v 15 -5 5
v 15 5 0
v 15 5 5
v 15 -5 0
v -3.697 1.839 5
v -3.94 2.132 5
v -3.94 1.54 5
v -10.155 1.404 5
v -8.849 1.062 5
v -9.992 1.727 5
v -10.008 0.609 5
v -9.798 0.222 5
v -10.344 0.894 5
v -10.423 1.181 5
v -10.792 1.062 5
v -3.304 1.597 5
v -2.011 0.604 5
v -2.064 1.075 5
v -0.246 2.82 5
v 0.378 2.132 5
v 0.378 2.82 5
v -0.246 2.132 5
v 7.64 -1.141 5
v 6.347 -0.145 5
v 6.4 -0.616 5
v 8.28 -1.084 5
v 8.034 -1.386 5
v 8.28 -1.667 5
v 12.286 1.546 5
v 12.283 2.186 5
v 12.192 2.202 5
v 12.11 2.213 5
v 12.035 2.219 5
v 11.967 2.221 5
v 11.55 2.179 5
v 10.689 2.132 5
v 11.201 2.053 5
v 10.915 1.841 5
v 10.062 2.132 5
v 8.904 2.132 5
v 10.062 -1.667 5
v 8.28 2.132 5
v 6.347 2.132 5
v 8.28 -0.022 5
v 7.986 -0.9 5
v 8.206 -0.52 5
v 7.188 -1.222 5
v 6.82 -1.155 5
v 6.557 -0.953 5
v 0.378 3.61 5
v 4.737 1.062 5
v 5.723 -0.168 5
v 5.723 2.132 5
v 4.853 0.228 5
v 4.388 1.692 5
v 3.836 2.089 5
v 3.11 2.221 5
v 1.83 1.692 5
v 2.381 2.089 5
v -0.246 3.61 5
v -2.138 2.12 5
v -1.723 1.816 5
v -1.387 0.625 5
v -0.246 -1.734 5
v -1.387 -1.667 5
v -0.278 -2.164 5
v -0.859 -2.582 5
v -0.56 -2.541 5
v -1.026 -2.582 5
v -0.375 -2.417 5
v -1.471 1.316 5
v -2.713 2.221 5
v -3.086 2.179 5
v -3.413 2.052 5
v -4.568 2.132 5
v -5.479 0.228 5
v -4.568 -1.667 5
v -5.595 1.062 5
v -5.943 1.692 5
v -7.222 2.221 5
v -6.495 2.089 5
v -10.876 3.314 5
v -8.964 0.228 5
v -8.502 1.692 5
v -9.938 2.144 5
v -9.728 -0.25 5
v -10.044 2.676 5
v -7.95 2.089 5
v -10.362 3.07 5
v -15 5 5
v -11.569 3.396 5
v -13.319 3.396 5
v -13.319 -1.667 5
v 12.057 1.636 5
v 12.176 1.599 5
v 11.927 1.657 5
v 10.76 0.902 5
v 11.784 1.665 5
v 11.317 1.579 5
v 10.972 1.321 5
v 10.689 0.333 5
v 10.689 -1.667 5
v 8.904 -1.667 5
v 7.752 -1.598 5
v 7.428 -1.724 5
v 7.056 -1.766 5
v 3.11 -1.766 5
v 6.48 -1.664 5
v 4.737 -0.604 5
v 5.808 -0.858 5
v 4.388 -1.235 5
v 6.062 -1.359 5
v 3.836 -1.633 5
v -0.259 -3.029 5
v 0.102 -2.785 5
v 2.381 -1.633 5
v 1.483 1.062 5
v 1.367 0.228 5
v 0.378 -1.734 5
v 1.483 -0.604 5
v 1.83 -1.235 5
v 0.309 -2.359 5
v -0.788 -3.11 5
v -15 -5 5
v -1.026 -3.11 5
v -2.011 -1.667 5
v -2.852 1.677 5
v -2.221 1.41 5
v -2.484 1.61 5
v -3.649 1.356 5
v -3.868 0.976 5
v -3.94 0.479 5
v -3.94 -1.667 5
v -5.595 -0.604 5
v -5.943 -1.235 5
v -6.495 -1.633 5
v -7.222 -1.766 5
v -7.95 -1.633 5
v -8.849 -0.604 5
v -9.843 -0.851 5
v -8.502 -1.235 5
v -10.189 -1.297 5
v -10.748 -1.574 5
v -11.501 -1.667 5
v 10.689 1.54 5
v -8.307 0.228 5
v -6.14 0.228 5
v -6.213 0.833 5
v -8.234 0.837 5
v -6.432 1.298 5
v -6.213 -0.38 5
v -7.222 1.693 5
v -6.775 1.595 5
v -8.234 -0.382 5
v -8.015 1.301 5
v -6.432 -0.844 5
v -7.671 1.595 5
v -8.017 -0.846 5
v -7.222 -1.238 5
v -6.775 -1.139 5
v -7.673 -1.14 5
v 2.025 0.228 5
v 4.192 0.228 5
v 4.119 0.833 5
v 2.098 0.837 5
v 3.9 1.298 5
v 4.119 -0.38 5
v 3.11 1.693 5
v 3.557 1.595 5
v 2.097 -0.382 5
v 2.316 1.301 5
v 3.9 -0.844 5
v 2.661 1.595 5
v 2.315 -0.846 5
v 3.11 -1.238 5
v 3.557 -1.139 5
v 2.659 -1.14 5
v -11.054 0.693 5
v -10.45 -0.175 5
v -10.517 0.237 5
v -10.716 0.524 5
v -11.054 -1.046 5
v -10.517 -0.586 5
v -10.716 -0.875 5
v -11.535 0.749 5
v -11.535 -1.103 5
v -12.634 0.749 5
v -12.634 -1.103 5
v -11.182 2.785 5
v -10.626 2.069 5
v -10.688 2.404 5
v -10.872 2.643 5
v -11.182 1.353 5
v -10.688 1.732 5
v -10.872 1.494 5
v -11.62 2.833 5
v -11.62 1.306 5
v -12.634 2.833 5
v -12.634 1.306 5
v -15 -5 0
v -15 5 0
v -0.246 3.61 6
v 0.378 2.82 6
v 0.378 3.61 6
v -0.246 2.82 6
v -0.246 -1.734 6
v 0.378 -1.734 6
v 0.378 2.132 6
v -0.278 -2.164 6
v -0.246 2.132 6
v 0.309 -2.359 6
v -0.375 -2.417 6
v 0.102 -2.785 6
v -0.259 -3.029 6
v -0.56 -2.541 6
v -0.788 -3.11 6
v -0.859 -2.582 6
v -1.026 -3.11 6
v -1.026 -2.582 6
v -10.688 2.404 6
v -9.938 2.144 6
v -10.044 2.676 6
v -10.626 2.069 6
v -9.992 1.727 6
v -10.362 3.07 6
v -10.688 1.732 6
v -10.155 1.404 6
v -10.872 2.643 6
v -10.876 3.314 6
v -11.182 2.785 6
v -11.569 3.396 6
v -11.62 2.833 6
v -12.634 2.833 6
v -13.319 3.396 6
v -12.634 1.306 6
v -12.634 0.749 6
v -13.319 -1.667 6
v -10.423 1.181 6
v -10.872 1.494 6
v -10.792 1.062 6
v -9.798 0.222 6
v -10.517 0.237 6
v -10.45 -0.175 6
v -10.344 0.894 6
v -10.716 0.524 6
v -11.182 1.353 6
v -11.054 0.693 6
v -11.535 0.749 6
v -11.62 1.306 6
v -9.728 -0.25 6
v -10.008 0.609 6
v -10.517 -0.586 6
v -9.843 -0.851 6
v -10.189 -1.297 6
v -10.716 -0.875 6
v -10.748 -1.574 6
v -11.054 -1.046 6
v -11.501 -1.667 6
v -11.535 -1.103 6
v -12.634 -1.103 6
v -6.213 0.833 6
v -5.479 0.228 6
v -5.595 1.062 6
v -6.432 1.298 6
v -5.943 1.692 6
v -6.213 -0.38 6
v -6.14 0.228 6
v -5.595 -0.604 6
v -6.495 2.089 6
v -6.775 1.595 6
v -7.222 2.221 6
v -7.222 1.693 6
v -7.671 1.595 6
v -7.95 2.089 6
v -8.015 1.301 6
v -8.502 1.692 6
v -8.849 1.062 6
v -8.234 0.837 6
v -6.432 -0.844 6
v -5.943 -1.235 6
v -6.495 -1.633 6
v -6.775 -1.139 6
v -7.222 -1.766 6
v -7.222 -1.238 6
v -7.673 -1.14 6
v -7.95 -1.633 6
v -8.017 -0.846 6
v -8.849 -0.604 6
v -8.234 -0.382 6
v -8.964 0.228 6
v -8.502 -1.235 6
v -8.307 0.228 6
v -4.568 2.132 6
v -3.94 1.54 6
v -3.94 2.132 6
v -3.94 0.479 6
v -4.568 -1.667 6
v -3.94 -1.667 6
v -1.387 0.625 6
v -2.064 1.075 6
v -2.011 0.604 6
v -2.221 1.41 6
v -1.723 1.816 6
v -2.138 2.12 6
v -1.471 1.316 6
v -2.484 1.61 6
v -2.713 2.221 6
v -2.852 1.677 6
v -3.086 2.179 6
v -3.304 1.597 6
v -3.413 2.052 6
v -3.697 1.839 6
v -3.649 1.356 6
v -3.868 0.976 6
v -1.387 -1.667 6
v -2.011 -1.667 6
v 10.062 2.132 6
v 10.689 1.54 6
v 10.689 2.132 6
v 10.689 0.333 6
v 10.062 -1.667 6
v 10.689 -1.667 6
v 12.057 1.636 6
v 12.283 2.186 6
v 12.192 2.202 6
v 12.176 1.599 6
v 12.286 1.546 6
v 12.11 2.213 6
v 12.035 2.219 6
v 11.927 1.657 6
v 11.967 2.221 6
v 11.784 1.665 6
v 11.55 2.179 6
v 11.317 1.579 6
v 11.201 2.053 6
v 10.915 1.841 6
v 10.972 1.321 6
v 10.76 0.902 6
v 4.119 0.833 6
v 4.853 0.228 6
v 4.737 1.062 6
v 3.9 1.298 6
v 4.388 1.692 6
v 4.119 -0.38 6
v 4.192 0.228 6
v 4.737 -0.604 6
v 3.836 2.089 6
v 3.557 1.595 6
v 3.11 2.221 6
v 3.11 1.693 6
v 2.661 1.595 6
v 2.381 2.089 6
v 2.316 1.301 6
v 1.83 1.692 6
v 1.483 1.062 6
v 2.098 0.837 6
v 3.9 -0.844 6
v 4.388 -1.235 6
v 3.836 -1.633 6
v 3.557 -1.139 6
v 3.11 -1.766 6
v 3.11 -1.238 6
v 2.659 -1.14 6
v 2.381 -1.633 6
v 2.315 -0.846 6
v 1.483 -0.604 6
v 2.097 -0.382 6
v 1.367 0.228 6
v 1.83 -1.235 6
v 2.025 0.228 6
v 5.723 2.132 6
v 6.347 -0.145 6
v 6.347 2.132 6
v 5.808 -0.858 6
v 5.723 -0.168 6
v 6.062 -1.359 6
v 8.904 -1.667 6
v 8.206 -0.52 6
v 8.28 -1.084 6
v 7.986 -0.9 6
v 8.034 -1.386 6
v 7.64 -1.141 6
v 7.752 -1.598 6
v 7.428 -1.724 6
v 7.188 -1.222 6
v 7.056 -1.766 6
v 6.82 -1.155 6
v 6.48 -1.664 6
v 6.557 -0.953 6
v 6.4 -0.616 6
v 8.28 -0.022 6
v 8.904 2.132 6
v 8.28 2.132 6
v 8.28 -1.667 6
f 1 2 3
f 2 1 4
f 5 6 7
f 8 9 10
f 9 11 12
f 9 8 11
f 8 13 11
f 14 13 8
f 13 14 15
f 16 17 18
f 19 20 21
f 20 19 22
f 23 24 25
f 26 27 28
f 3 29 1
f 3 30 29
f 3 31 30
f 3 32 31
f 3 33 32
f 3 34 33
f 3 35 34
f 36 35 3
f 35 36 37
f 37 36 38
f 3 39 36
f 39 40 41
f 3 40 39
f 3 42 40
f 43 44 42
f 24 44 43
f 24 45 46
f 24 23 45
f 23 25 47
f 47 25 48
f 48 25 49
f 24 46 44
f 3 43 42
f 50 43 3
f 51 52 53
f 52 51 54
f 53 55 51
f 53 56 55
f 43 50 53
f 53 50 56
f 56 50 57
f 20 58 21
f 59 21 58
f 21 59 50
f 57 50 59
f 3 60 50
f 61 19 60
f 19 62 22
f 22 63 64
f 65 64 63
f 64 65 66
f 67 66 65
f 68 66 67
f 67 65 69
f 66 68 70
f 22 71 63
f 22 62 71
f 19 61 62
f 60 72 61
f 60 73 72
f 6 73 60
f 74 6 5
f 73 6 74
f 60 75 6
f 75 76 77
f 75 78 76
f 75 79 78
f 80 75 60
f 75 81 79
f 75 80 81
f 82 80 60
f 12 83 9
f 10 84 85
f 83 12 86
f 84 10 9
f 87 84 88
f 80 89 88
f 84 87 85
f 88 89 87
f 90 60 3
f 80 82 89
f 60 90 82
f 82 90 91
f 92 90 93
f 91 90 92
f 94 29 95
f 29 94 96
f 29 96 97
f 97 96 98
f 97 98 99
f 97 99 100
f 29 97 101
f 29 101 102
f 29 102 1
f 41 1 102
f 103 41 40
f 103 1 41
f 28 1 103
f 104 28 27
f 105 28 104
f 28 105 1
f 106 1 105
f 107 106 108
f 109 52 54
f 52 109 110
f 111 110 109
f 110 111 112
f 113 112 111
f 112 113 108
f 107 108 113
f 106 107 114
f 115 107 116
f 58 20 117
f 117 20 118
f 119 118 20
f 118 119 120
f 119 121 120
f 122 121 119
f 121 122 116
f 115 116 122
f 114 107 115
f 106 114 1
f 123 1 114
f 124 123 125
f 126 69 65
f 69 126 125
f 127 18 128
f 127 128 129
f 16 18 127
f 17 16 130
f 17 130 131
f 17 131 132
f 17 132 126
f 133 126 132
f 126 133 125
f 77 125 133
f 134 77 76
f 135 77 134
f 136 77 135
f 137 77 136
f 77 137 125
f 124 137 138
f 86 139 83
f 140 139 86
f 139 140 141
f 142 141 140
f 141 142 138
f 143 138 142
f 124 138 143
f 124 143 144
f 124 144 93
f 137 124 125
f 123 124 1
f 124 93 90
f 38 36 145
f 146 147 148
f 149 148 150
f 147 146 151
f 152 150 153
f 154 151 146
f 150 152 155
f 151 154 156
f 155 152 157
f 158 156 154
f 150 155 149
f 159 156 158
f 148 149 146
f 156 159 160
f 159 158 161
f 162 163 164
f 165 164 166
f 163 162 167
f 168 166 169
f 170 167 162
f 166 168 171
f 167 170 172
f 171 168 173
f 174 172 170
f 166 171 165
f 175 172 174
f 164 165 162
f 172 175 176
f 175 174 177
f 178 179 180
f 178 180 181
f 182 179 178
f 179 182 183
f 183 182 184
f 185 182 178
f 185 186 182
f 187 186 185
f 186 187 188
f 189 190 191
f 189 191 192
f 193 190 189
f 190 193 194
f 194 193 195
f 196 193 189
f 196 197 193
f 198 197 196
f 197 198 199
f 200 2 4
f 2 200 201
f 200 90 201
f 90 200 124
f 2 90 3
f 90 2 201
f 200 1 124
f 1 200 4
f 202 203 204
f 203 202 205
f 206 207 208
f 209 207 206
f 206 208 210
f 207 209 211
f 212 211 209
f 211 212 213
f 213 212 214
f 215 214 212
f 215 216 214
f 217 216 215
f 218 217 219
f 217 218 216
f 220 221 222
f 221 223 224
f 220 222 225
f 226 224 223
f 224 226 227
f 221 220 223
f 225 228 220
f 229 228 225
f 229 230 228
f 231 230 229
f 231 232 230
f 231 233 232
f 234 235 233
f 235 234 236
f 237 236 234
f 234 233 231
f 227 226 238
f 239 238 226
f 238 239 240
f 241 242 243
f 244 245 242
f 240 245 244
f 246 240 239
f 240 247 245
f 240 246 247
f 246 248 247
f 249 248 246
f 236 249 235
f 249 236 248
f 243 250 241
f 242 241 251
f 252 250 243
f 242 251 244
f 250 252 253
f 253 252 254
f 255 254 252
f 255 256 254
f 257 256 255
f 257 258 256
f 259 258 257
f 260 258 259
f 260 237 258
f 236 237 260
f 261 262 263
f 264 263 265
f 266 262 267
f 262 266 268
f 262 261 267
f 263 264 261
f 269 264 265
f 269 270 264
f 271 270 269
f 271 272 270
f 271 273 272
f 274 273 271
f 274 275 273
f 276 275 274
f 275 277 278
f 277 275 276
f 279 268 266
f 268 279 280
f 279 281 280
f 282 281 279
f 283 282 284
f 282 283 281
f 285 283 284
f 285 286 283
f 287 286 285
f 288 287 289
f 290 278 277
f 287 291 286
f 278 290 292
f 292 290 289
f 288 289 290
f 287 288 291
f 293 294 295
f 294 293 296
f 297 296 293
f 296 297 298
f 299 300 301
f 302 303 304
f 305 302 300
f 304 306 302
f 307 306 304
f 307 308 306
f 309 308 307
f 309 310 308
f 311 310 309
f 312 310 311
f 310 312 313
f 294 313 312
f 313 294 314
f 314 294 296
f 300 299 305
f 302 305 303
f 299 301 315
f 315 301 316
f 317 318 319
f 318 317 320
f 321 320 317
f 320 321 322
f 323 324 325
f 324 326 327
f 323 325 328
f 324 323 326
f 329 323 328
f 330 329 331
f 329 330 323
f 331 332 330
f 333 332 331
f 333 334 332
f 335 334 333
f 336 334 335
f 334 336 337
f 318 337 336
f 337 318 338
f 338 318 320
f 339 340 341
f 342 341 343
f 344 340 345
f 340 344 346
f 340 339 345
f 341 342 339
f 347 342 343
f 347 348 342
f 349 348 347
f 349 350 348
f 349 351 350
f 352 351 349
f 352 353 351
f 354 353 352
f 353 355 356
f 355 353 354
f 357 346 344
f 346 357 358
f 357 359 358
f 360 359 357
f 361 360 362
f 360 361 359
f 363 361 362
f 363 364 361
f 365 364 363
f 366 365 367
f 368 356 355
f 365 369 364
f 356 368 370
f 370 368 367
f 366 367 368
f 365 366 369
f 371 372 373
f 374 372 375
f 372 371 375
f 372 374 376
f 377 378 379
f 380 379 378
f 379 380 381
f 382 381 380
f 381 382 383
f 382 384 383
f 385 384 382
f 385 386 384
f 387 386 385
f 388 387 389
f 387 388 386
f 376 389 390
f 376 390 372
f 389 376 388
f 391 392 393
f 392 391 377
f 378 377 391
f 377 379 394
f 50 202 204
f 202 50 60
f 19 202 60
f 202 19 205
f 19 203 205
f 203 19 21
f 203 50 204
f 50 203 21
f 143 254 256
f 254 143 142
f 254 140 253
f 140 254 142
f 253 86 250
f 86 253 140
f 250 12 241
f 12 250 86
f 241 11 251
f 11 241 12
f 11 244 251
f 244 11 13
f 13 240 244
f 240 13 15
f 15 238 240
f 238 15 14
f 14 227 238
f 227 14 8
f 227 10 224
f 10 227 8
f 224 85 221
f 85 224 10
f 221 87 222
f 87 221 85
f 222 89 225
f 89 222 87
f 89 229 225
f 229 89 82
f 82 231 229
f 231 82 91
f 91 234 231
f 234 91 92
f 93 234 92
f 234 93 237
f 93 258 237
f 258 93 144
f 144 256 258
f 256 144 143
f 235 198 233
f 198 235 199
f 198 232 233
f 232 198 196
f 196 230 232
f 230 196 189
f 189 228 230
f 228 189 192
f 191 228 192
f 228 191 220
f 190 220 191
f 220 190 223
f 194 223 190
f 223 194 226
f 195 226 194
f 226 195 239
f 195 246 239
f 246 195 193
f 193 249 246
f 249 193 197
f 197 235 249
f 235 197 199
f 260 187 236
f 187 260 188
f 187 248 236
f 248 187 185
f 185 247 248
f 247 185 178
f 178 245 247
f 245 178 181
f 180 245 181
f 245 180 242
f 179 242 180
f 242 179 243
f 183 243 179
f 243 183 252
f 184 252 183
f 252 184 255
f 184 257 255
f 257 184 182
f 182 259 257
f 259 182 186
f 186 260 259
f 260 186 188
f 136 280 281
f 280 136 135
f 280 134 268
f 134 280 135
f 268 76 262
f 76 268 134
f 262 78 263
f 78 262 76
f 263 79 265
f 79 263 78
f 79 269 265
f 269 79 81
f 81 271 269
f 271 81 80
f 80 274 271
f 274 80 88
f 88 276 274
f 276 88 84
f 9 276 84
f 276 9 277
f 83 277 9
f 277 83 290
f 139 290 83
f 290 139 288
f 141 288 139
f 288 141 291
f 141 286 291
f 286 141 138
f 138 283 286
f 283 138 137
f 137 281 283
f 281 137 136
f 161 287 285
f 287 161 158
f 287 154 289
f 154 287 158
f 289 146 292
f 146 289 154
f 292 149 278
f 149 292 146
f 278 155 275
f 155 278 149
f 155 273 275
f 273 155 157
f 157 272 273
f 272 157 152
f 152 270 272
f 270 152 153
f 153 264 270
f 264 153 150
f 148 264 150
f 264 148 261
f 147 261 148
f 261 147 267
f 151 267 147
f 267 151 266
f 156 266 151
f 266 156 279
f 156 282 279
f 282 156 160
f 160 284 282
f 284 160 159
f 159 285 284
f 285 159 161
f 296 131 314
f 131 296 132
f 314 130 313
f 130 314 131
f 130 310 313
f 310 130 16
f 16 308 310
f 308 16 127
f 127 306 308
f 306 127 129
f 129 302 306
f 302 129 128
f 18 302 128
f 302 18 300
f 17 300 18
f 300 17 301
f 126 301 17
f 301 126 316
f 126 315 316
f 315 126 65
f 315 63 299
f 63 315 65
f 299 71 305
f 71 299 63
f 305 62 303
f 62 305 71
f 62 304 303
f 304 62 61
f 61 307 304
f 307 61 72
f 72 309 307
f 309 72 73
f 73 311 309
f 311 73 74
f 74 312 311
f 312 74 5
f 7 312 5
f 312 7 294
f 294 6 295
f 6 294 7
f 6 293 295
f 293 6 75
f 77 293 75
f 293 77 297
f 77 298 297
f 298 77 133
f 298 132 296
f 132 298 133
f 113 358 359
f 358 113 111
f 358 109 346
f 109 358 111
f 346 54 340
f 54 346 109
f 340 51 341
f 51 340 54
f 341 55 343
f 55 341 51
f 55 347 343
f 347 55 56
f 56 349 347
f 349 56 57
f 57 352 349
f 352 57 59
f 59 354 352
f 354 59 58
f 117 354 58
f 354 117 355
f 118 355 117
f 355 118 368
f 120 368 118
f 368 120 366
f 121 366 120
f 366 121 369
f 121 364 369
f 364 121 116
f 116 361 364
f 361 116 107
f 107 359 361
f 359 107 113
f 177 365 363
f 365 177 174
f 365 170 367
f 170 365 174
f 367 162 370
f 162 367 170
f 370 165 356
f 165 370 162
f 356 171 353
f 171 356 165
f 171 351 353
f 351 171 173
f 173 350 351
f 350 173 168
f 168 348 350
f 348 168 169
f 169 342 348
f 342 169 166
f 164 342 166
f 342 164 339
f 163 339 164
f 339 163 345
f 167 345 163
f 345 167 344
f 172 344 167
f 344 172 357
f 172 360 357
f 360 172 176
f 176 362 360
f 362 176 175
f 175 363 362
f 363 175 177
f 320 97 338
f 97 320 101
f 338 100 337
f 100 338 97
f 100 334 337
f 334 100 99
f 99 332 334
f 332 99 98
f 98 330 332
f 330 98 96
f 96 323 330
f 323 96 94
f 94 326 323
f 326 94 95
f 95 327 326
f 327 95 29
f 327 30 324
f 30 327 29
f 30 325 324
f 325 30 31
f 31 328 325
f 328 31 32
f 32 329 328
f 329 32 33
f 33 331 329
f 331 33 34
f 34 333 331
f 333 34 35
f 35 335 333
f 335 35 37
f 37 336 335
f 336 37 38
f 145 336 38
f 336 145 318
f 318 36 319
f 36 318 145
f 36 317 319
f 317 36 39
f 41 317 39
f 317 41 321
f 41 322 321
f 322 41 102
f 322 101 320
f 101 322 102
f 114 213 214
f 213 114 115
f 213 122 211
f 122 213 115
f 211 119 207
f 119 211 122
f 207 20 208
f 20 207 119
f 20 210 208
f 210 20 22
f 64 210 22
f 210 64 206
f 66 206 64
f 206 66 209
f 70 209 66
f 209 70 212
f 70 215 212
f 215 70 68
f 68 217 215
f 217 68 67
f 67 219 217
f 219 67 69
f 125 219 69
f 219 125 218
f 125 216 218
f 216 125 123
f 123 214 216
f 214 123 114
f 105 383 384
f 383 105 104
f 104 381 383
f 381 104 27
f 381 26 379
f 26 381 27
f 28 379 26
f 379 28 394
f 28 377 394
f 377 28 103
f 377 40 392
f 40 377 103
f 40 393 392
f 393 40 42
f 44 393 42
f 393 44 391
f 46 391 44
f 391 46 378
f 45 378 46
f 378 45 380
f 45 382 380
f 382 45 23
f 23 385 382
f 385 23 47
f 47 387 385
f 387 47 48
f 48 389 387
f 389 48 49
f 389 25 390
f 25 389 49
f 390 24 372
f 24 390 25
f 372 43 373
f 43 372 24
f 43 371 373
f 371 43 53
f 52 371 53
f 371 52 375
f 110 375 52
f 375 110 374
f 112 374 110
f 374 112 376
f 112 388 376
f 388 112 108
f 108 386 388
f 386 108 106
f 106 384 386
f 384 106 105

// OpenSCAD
$fn = 2; 
texte_a_inserer = "Bonjour"; 
taille = 5; 
police = "DejaVuSans"; //[[Abril Fatface,Aclonica,Acme,Advent Pro,Akronim,Aladin,Alegreya,Alegreya Sans,Alegreya SC,Alex Brush,Alfa Slab One,Alice,Amaranth,Architects Daughter,Archivo Black,Archivo Narrow,Arimo,Arvo,Asap,Astloch,Asul,Averia Libre,Averia Serif Libre,Bangers,Basic,Belgrano,Berkshire Swash,Bigshot One,Bilbo Swash Caps,Black Ops One,Bonbon,Bowlby One SC,Brawler,Bubblegum Sans,Butterfly Kids,Cabin Condensed,Caesar Dressing,Cagliostro,Calligraffitti,Capriola,Carter One,Changa One,Chango,Chelsea Market,Cherry Cream Soda,Chewy,Chicle,Chivo,Clicker Script,Coming Soon,Concert One,Condiment,Cookie,Courgette,Covered By Your Grace,Crimson Text,Dancing Script,DejaVu Sans,DejaVu Serif,Dhurjati,Doppio One,Dosis,Droid Sans,Eagle Lake,Electrolize,Emilys Candy,Encode Sans,Encode Sans Compressed,Euphoria Script,Exo,Exo 2,Faster One,Federo,Finger Paint,Fjord One,Fontdiner Swanky,Freckle Face,Fruktur,Gabriela,Geo,Germania One,Give You Glory,Gloria Hallelujah,Goudy Bookletter 1911,Graduate,Grand Hotel,Great Vibes,Griffy,Hanalei Fill,Happy Monkey,Henny Penny,Hind,IM Fell English SC,Indie Flower,Irish Grover,Italianno,Jacques Francois Shadow,Jolly Lodger,Josefin Slab,Joti One,Judson,Just Another Hand,Kalam,Kameron,Karma,Kavoon,Knewave,Kranky,Kristi,Laila,Lakki Reddy,Lancelot,Lato,Leckerli One,Ledger,Lekton,Lemon One,Liberation Sans,Libre Caslon Text,Life Savers,Lilita One,Lily Script One,Limelight,Lobster,Lobster Two,Londrina Outline,Londrina Shadow,Londrina Solid,Lora,Love Ya Like A Sister,Loved by the King,Lovers Quarrel,Luckiest Guy,Lusitana,Macondo,Macondo Swash Caps,Mako,Marck Script,Margarine,Marko One,Maven Pro,McLaren,MedievalSharp,Merienda One,Merriweather,Mervale Script,Metal Mania,Metrophobic,Milonga,Miltonian Tattoo,Miss Fajardose,Molle,Montez,Montserrat,Mr De Haviland,Mystery Quest,Neucha,New Rocker,Niconne,Nosifer,Nothing You Could Do,Noto Sans Oriya,Noto Serif,Nova Square,Nunito,Old Standard TT,Oleo Script,Oleo Script Swash Caps,Orbitron,Oregano,Orienta,Original Surfer,Oswald,Over the Rainbow,Overlock,Oxygen,Pacifico,Paprika,Parisienne,Patrick Hand SC,Paytone One,Peralta,Permanent Marker,Piedra,Pirata One,Play,Playball,Poetsen One,Poppins,Press Start 2P,Princess Sofia,PT Mono,Qwigley,Racing Sans One,Raleway,Rancho,Ranga,Ribeye,Roboto,Roboto Condensed,Roboto Slab,Rochester,Rock Salt,Rubik One,Sail,Salsa,Sansita One,Sarina,Satisfy,Schoolbell,Seaweed Script,Sevillana,Shadows Into Light,Shadows Into Light Two,Share,Six Caps,Skranji,Source Sans Pro,Spicy Rice,Stardos Stencil,Stoke,Syncopate,Teko,Terminal Dosis,The Girl Next Door,Tillana,Timmana,Titillium Web,Ubuntu,Ultra,Underdog,UnifrakturCook,UnifrakturMaguntia,Vampiro One,Vidaloka,Viga,Voces,Volkhov,Vollkorn,Voltaire,Waiting for the Sunrise,Wallpoet,Wellfleet,Wendy One,Yellowtail,Yesteryear,Zeyada]]
hauteur = 1; 
longueur_cube = 30; 
largeur_cube = 10; 
hauteur_cube = 5; 
relief_extrusion = "relief"; //[relief,extru]
module rendu(){
linear_extrude(hauteur) text(texte_a_inserer,size = taille, font = police);
}
module finao(){
if ( relief_extrusion == "relief") {
   union(){
 translate([0,0,0])   cube([longueur_cube,largeur_cube,hauteur_cube]);
translate([1,(largeur_cube/3),hauteur_cube]) rendu();
   } 
}
else
{
difference(){
 translate([0,0,0])   cube([longueur_cube,largeur_cube,hauteur_cube]);
translate([1,(largeur_cube/3),(hauteur_cube -hauteur+0.1)]) rendu();
}
 }
}
translate ([-(longueur_cube/2),-(largeur_cube/2),0]) finao();
